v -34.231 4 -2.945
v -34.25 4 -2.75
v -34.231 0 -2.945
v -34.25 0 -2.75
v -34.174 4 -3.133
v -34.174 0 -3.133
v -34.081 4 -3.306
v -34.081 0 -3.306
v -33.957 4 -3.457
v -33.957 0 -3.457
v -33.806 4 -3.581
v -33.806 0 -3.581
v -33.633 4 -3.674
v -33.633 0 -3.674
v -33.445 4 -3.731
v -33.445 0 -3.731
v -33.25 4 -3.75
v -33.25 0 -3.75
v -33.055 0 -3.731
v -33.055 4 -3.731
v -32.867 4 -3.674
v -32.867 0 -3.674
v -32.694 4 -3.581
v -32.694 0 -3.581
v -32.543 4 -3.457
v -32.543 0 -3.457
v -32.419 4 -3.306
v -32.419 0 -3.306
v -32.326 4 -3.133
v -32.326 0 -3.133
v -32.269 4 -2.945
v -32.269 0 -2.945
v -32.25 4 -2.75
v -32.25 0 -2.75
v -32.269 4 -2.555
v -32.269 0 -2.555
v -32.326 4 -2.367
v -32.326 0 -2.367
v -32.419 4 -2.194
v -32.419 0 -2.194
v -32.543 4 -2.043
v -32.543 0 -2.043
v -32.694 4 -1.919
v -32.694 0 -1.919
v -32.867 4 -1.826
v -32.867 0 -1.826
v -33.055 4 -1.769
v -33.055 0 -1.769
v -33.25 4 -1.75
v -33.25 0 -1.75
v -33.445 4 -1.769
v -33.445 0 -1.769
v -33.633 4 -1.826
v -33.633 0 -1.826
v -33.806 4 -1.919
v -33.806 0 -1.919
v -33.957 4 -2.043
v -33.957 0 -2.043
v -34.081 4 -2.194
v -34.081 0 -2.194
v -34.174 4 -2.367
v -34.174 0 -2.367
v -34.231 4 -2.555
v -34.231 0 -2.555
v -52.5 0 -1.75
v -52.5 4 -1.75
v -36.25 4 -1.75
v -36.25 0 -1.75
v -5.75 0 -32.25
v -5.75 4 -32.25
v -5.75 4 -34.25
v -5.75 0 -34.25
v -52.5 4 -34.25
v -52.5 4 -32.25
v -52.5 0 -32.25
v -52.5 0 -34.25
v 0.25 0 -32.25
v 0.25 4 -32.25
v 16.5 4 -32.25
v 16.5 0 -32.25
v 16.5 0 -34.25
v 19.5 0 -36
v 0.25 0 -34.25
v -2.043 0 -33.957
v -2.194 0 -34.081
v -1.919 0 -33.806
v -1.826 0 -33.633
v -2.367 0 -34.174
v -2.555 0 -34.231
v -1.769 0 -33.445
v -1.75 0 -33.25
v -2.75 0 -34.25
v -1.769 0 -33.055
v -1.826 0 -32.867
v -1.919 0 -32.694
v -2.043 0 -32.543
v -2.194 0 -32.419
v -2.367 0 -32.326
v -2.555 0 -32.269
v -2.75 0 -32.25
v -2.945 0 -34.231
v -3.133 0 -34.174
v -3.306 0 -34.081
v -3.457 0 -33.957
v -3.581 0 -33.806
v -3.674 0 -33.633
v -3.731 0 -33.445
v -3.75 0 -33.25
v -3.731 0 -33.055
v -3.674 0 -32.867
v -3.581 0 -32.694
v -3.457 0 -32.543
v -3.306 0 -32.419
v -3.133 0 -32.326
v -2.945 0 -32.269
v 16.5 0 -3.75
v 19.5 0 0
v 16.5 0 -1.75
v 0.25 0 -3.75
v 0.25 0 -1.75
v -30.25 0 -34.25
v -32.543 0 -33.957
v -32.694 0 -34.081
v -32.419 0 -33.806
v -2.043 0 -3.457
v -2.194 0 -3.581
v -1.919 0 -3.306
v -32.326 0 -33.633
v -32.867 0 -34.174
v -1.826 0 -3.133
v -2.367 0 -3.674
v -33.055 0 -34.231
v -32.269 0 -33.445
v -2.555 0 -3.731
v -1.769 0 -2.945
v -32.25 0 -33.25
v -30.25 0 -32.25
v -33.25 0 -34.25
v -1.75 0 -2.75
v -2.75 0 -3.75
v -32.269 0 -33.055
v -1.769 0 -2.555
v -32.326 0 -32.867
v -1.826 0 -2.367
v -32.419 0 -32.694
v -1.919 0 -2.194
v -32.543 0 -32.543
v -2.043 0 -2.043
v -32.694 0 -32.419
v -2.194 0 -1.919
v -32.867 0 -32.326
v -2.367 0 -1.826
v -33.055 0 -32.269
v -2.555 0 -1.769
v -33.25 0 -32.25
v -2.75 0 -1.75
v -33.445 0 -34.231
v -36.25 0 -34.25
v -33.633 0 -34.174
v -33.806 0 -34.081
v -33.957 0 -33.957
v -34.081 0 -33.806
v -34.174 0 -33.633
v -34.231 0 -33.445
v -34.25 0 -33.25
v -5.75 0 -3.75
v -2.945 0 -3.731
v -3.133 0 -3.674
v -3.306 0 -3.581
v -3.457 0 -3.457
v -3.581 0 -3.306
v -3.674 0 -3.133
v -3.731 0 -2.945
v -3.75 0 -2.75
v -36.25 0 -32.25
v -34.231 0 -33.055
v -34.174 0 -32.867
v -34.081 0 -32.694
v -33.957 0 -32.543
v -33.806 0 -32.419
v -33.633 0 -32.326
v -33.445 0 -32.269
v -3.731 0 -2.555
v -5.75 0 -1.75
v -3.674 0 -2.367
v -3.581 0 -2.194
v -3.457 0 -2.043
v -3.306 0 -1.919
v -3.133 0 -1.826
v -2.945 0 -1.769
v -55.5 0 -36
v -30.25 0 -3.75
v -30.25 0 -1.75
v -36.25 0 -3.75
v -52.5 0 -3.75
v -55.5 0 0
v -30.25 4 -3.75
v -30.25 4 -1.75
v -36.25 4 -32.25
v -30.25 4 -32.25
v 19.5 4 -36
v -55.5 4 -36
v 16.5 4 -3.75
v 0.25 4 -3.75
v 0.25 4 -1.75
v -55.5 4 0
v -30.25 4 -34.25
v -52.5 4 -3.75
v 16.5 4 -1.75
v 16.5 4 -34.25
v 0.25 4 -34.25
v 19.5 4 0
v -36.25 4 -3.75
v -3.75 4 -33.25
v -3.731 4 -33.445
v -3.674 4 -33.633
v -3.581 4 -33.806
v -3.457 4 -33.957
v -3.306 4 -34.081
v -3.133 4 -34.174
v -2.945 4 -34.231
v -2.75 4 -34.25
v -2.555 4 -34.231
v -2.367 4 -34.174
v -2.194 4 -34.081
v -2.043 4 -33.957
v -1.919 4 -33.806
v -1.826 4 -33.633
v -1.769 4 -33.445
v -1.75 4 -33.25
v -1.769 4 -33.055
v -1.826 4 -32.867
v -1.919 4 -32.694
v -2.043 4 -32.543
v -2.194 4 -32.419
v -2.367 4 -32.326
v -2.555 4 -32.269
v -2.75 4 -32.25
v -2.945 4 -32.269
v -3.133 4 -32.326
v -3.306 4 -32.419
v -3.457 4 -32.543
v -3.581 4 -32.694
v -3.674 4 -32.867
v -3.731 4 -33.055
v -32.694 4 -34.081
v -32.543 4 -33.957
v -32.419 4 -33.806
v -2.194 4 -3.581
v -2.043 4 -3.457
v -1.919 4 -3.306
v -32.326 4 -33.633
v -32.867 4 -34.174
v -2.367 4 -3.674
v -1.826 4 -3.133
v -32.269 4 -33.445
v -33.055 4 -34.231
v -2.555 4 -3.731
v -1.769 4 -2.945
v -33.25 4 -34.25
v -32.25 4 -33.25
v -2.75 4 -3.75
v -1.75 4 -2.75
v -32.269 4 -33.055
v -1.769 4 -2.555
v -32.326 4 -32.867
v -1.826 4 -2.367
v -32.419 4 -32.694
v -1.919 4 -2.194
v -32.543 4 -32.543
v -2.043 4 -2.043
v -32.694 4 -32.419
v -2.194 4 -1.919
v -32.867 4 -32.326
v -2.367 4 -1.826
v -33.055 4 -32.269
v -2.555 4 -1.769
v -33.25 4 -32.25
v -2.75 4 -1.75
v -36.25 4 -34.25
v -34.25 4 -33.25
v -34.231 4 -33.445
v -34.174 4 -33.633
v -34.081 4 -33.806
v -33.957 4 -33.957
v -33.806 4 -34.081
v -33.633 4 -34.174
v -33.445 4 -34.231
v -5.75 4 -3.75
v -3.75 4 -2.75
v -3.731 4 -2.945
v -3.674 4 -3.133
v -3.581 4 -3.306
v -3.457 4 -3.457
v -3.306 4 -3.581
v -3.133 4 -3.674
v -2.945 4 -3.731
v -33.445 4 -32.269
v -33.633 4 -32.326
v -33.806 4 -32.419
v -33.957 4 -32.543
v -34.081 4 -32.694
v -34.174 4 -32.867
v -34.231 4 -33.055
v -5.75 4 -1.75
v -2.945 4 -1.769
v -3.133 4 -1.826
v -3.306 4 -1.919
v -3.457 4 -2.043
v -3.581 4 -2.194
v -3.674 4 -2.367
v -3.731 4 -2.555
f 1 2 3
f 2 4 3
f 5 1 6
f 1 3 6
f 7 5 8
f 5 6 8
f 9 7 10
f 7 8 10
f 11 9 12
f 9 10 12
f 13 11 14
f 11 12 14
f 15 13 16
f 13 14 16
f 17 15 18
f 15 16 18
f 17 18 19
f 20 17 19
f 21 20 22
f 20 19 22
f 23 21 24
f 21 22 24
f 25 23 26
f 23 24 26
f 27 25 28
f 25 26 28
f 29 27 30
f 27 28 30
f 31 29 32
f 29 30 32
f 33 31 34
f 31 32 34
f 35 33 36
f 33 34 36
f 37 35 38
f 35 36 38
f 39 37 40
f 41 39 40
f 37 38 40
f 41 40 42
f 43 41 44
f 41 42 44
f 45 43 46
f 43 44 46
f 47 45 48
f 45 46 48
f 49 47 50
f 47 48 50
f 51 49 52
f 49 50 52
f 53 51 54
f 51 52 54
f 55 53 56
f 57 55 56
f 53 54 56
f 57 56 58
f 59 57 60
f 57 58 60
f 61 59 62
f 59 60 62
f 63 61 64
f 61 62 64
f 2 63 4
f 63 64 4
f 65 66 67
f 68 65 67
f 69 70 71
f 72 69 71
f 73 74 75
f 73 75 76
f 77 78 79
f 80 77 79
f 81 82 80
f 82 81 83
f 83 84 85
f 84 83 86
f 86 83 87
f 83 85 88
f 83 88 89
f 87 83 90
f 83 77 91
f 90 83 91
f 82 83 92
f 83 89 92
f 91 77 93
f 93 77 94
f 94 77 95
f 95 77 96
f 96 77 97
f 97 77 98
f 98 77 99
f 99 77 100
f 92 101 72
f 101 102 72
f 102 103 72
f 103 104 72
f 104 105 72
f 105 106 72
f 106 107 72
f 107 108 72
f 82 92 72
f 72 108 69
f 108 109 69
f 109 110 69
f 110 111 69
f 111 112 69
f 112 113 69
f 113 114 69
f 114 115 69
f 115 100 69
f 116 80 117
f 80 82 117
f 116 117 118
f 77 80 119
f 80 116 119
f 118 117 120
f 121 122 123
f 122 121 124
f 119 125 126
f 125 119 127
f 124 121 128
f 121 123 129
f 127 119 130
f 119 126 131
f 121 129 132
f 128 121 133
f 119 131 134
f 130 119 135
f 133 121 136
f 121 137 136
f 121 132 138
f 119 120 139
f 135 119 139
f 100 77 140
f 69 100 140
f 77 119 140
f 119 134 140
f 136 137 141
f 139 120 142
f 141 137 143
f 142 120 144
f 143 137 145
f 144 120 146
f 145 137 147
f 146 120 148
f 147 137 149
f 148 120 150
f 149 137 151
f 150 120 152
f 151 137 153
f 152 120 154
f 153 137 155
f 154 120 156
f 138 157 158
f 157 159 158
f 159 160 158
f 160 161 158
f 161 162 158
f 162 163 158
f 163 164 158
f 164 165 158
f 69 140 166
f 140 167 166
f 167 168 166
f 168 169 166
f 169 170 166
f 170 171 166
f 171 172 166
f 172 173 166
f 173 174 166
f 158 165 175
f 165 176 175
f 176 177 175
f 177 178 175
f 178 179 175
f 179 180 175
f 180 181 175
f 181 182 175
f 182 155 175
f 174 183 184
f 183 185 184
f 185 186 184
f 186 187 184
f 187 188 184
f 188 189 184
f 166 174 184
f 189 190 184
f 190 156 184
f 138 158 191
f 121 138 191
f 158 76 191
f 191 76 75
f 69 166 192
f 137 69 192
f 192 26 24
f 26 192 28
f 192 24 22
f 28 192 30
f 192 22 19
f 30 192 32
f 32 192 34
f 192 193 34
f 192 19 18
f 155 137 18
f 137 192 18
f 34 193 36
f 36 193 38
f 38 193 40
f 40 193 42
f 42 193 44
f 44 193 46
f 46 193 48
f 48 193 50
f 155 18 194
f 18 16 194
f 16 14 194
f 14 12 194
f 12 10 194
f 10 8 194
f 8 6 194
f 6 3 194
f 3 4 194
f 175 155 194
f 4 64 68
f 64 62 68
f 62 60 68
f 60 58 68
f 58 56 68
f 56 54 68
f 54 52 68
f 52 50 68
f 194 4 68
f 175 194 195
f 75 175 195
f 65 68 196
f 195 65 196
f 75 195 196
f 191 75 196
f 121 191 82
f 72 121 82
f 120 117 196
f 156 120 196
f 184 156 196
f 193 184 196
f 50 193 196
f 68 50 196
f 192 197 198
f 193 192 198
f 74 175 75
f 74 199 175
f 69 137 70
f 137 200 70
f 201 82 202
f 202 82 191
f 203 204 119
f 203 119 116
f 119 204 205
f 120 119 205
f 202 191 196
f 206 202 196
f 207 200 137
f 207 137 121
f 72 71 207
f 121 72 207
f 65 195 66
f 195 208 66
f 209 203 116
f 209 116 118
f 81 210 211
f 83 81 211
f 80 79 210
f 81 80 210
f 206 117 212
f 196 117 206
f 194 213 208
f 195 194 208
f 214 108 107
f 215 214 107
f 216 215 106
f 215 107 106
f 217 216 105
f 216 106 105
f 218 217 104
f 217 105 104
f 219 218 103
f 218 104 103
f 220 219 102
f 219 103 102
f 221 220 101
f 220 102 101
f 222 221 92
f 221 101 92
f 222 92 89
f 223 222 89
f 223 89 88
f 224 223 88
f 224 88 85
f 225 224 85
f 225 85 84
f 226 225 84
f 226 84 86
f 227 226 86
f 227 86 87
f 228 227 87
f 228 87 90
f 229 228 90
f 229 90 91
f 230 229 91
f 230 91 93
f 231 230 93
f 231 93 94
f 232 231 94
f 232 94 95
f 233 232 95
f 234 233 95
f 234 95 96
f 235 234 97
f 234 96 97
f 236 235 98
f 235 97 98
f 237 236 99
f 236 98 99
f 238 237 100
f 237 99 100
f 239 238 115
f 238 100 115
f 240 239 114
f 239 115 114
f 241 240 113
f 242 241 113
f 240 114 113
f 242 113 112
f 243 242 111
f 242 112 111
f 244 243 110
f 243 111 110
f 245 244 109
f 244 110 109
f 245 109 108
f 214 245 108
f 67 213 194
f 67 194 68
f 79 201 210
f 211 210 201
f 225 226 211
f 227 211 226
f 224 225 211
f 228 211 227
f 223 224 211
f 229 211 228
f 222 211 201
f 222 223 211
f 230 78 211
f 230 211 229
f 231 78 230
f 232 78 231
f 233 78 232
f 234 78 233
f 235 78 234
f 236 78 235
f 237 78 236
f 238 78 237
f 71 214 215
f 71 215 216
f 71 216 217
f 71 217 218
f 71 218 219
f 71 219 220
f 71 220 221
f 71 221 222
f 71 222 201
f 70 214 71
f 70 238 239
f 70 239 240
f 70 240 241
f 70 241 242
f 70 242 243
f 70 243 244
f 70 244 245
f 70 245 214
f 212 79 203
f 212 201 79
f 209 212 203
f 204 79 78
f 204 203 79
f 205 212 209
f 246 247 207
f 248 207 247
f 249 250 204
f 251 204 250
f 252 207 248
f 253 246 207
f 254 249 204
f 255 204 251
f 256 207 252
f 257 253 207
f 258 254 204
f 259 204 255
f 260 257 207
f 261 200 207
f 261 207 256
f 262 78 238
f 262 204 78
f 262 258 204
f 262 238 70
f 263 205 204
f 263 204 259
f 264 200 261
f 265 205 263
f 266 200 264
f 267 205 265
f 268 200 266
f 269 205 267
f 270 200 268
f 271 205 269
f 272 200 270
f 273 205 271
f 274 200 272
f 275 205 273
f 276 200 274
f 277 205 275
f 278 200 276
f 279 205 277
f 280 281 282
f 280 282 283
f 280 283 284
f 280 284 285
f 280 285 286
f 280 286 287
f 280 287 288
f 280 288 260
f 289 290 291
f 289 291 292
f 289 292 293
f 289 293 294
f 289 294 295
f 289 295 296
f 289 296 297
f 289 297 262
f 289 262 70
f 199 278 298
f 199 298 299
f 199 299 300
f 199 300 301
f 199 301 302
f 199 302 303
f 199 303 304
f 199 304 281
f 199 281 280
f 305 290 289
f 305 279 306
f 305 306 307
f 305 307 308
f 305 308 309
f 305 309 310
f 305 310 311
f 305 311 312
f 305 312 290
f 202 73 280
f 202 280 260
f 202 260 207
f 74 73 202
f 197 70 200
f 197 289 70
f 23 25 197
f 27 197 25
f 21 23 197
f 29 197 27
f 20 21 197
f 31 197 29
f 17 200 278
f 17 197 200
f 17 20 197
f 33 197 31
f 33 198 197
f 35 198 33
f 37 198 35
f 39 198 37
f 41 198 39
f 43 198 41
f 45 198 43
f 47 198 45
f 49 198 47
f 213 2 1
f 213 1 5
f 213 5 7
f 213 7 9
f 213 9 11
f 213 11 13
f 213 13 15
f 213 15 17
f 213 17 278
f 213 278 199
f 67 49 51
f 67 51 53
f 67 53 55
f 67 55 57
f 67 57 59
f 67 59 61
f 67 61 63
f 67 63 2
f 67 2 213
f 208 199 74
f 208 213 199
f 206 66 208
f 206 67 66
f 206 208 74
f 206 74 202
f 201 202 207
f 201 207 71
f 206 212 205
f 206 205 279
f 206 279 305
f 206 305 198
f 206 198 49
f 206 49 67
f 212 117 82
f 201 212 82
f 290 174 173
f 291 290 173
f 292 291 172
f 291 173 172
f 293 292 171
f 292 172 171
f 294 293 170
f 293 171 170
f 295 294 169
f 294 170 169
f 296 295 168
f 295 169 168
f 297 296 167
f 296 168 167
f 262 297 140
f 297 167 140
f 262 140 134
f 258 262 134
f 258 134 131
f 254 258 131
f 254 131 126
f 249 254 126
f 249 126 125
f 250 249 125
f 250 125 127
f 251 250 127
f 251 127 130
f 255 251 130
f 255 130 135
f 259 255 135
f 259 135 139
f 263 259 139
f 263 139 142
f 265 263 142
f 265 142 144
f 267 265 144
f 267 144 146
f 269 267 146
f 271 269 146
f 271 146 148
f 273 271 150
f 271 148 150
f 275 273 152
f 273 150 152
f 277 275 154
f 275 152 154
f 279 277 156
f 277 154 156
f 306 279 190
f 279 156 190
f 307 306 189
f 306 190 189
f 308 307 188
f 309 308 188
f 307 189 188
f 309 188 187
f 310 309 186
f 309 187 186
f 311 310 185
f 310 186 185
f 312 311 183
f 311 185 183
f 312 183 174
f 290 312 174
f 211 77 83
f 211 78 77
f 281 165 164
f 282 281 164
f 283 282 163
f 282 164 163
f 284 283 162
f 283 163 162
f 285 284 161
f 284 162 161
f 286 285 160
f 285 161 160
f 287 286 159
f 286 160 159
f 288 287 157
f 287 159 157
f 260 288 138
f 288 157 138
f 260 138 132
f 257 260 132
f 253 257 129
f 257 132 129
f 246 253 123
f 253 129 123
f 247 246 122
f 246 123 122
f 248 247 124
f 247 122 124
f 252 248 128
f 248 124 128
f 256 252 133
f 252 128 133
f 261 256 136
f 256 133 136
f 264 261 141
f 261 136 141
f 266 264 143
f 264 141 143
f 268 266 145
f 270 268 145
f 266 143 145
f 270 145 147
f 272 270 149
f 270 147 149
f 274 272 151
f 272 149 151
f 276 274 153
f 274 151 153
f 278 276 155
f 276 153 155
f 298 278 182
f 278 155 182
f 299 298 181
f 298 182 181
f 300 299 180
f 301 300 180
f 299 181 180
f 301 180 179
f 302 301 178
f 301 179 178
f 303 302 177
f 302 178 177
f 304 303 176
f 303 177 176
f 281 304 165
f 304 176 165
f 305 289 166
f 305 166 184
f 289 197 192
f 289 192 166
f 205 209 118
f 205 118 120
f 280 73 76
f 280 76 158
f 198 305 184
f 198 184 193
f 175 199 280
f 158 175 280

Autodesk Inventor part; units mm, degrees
ref_plane "YZ Plane" through (0, 0, 0) normal (1, 0, 0) x (0, 1, 0)
ref_plane "XZ Plane" through (0, 0, 0) normal (0, 1, 0) x (-1, 0, 0)
ref_plane "XY Plane" through (0, 0, 0) normal (0, 0, 1) x (1, 0, 0)
sketch "Sketch1" plane through (0, 0, 0) normal (0, 1, 0) x (-1, 0, 0)
  line L0 (0, 0) -> (36, 0)
  line L1 (36, 0) -> (36, -36)
  line L2 (36, -36) -> (0, -36)
  line L3 (0, -36) -> (0, 0)
  line L4 (0, 0) -> (18, 0)
  line L5 (18, 0) -> (18, -18)
  line L6 (18, -18) -> (0, -18)
  line L7 (0, -18) -> (0, 0)
  line L8 (18, -18) -> (33.25, -18)
  line L9 (33.25, -18) -> (33.25, -33.25)
  line L10 (33.25, -33.25) -> (18, -33.25)
  line L11 (18, -33.25) -> (18, -18)
  line L12 (33.25, -33.25) -> (2.75, -33.25)
  line L13 (2.75, -33.25) -> (2.75, -2.75)
  line L14 (2.75, -2.75) -> (33.25, -2.75)
  line L15 (33.25, -2.75) -> (33.25, -33.25)
  circle A0 centre (33.25, -2.75) radius 1
  circle A1 centre (33.25, -33.25) radius 1
  circle A2 centre (2.75, -33.25) radius 1
  circle A3 centre (2.75, -2.75) radius 1
  line L16 (18, -18) -> (55.5, -18)
  line L17 (55.5, -18) -> (55.5, 0)
  line L18 (55.5, 0) -> (18, 0)
  line L19 (18, 0) -> (18, -18)
  line L20 (55.5, 0) -> (-19.5, 0)
  line L21 (-19.5, 0) -> (-19.5, -36)
  line L22 (-19.5, -36) -> (55.5, -36)
  line L23 (55.5, -36) -> (55.5, 0)
  line L24 (-19.5, 0) -> (55.5, 0)
  line L25 (55.5, 0) -> (55.5, 10)
  line L26 (55.5, 10) -> (-19.5, 10)
  line L27 (-19.5, 10) -> (-19.5, 0)
  line L28 (-19.5, -36) -> (55.5, -36)
  line L29 (55.5, -36) -> (55.5, -46)
  line L30 (55.5, -46) -> (-19.5, -46)
  line L31 (-19.5, -46) -> (-19.5, -36)
  dimension "d0" = 36
  dimension "d1" = 36
  dimension "d2" = 18
  dimension "d3" = 18
  dimension "d4" = 15.25
  dimension "d5" = 15.25
  dimension "d6" = 30.5
  dimension "d7" = 30.5
  dimension "d8" = 2
  dimension "d9" = 2
  dimension "d10" = 2
  dimension "d11" = 2
  dimension "d12" = 37.5
  dimension "d13" = 75
  dimension "d16" = 75
  dimension "d17" = 10
  dimension "d18" = 75
  dimension "d19" = 10
extrude "Extrusion1" add sketch "Sketch1" along normal blind 4 contours L0 L5 L14 A3 L13 L6 L3 | L3 L22 L21 L20 | L0 L1 L16 L15 A0 L14 L5 | L6 L13 A2 L12 L10 A1 L9 L16 L1 L2 L3 | L18 L17 L16 L1 | L14 A0 L15 L8 L5 | L5 L6 L13 A3 L14 | L6 L11 L12 A2 L13 | L16 L23 L22 L1 | L8 L9 A1 L10 L11
sketch "Sketch2" plane through (0, 4, 0) normal (0, 1, 0) x (1, 0, 0)
  circle A0 centre (-33.25, 2.75) radius 1 projected
  line L0 (-33.25, 3.75) -> (-33.25, 1.75)
  line L1 (-33.25, 3.75) -> (-30.25, 3.75)
  line L2 (-30.25, 3.75) -> (-30.25, 1.75)
  line L3 (-30.25, 1.75) -> (-33.25, 1.75)
  line L4 (-33.25, 1.75) -> (-33.25, 3.75)
  line L5 (-30.25, 1.75) -> (-30.25, 3.75)
  line L6 (-55.5, 0) -> (19.5, 0) projected
  line L7 (19.5, 0) -> (19.5, 36) projected
  line L8 (-55.5, 0) -> (19.5, 0)
  line L9 (19.5, 0) -> (19.5, 18)
  line L10 (19.5, 18) -> (-55.5, 18)
  line L11 (-55.5, 18) -> (-55.5, 0)
  line L12 (-33.25, 3.75) -> (-55.5, 3.75)
  line L13 (-55.5, 3.75) -> (-55.5, 1.75)
  line L14 (-55.5, 1.75) -> (-33.25, 1.75)
  line L15 (-33.25, 1.75) -> (-33.25, 3.75)
  line L16 (-33.25, 3.75) -> (-36.25, 3.75)
  line L17 (-36.25, 3.75) -> (-36.25, 1.75)
  line L18 (-36.25, 1.75) -> (-33.25, 1.75)
  line L19 (-33.25, 1.75) -> (-33.25, 3.75)
  line L20 (-55.5, 3.75) -> (-52.5, 3.75)
  line L21 (-52.5, 3.75) -> (-52.5, 1.75)
  line L22 (-52.5, 1.75) -> (-55.5, 1.75)
  line L23 (-55.5, 1.75) -> (-55.5, 3.75)
  line L24 (-55.5, 36) -> (-55.5, 0) projected
  line L25 (-55.5, 36) -> (-18, 36)
  line L26 (-18, 36) -> (-18, 0)
  line L27 (-18, 0) -> (-55.5, 0)
  line L28 (-55.5, 0) -> (-55.5, 36)
  line L29 (-30.25, 3.75) -> (-18, 3.75)
  line L30 (-18, 3.75) -> (-18, 1.75)
  line L31 (-18, 1.75) -> (-30.25, 1.75)
  line L32 (-30.25, 1.75) -> (-30.25, 3.75)
  circle A1 centre (-33.25, 33.25) radius 1
  line L33 (-33.25, 32.25) -> (-33.25, 34.25)
  line L34 (-33.25, 32.25) -> (-30.25, 32.25)
  line L35 (-30.25, 32.25) -> (-30.25, 34.25)
  line L36 (-30.25, 34.25) -> (-33.25, 34.25)
  line L37 (-33.25, 34.25) -> (-33.25, 32.25)
  line L38 (-30.25, 34.25) -> (-30.25, 32.25)
  line L39 (-33.25, 32.25) -> (-55.5, 32.25)
  line L40 (-55.5, 32.25) -> (-55.5, 34.25)
  line L41 (-55.5, 34.25) -> (-33.25, 34.25)
  line L42 (-33.25, 34.25) -> (-33.25, 32.25)
  line L43 (-33.25, 32.25) -> (-36.25, 32.25)
  line L44 (-36.25, 32.25) -> (-36.25, 34.25)
  line L45 (-36.25, 34.25) -> (-33.25, 34.25)
  line L46 (-33.25, 34.25) -> (-33.25, 32.25)
  line L47 (-55.5, 32.25) -> (-52.5, 32.25)
  line L48 (-52.5, 32.25) -> (-52.5, 34.25)
  line L49 (-52.5, 34.25) -> (-55.5, 34.25)
  line L50 (-55.5, 34.25) -> (-55.5, 32.25)
  line L51 (-30.25, 32.25) -> (-18, 32.25)
  line L52 (-18, 32.25) -> (-18, 34.25)
  line L53 (-18, 34.25) -> (-30.25, 34.25)
  line L54 (-30.25, 34.25) -> (-30.25, 32.25)
  circle A2 centre (-2.75, 2.75) radius 1
  line L55 (-2.75, 3.75) -> (-2.75, 1.75)
  line L56 (-2.75, 3.75) -> (-5.75, 3.75)
  line L57 (-5.75, 3.75) -> (-5.75, 1.75)
  line L58 (-5.75, 1.75) -> (-2.75, 1.75)
  line L59 (-2.75, 1.75) -> (-2.75, 3.75)
  line L60 (-5.75, 1.75) -> (-5.75, 3.75)
  line L61 (19.5, 18) -> (19.5, 0)
  line L62 (-2.75, 3.75) -> (19.5, 3.75)
  line L63 (19.5, 3.75) -> (19.5, 1.75)
  line L64 (19.5, 1.75) -> (-2.75, 1.75)
  line L65 (-2.75, 1.75) -> (-2.75, 3.75)
  line L66 (-2.75, 3.75) -> (0.25, 3.75)
  line L67 (0.25, 3.75) -> (0.25, 1.75)
  line L68 (0.25, 1.75) -> (-2.75, 1.75)
  line L69 (-2.75, 1.75) -> (-2.75, 3.75)
  line L70 (19.5, 3.75) -> (16.5, 3.75)
  line L71 (16.5, 3.75) -> (16.5, 1.75)
  line L72 (16.5, 1.75) -> (19.5, 1.75)
  line L73 (19.5, 1.75) -> (19.5, 3.75)
  line L74 (19.5, 36) -> (19.5, 0)
  line L75 (19.5, 36) -> (-18, 36)
  line L76 (-18, 0) -> (19.5, 0)
  line L77 (19.5, 0) -> (19.5, 36)
  line L78 (-5.75, 3.75) -> (-18, 3.75)
  line L79 (-18, 1.75) -> (-5.75, 1.75)
  line L80 (-5.75, 1.75) -> (-5.75, 3.75)
  circle A3 centre (-2.75, 33.25) radius 1
  line L81 (-2.75, 32.25) -> (-2.75, 34.25)
  line L82 (-2.75, 32.25) -> (19.5, 32.25)
  line L83 (19.5, 34.25) -> (-2.75, 34.25)
  line L84 (16.5, 32.25) -> (16.5, 34.25)
  line L85 (19.5, 32.25) -> (16.5, 32.25)
  line L86 (16.5, 34.25) -> (19.5, 34.25)
  line L87 (19.5, 32.25) -> (19.5, 34.25)
  line L88 (19.5, 34.25) -> (19.5, 32.25)
  line L89 (0.25, 32.25) -> (0.25, 34.25)
  line L90 (-2.75, 32.25) -> (0.25, 32.25)
  line L91 (-2.75, 34.25) -> (-2.75, 32.25)
  line L92 (-2.75, 34.25) -> (-2.75, 32.25)
  line L93 (-2.75, 34.25) -> (-2.75, 32.25)
  line L94 (-2.75, 32.25) -> (-5.75, 32.25)
  line L95 (-5.75, 32.25) -> (-5.75, 34.25)
  line L96 (-5.75, 34.25) -> (-5.75, 32.25)
  line L97 (-5.75, 34.25) -> (-2.75, 34.25)
  line L98 (0.25, 34.25) -> (-2.75, 34.25)
  line L99 (-5.75, 34.25) -> (-5.75, 32.25)
  line L100 (-5.75, 32.25) -> (-18, 32.25)
  line L101 (-18, 34.25) -> (-5.75, 34.25)
  dimension "d20" = 3
  dimension "d24" = 3
  dimension "d25" = 3
extrude "Extrusion2" cut sketch "Sketch2" against normal up to surface (4 mm away) contours L29 L26 L31 L2 | L17 L14 L21 L12 | L78 L57 L79 L26 | L51 L35 L53 L26 | L26 L101 L95 L100 | L62 L71 L64 L67 | L82 L89 L83 L84 | L48 L41 L44 L39
properties part number "base"
